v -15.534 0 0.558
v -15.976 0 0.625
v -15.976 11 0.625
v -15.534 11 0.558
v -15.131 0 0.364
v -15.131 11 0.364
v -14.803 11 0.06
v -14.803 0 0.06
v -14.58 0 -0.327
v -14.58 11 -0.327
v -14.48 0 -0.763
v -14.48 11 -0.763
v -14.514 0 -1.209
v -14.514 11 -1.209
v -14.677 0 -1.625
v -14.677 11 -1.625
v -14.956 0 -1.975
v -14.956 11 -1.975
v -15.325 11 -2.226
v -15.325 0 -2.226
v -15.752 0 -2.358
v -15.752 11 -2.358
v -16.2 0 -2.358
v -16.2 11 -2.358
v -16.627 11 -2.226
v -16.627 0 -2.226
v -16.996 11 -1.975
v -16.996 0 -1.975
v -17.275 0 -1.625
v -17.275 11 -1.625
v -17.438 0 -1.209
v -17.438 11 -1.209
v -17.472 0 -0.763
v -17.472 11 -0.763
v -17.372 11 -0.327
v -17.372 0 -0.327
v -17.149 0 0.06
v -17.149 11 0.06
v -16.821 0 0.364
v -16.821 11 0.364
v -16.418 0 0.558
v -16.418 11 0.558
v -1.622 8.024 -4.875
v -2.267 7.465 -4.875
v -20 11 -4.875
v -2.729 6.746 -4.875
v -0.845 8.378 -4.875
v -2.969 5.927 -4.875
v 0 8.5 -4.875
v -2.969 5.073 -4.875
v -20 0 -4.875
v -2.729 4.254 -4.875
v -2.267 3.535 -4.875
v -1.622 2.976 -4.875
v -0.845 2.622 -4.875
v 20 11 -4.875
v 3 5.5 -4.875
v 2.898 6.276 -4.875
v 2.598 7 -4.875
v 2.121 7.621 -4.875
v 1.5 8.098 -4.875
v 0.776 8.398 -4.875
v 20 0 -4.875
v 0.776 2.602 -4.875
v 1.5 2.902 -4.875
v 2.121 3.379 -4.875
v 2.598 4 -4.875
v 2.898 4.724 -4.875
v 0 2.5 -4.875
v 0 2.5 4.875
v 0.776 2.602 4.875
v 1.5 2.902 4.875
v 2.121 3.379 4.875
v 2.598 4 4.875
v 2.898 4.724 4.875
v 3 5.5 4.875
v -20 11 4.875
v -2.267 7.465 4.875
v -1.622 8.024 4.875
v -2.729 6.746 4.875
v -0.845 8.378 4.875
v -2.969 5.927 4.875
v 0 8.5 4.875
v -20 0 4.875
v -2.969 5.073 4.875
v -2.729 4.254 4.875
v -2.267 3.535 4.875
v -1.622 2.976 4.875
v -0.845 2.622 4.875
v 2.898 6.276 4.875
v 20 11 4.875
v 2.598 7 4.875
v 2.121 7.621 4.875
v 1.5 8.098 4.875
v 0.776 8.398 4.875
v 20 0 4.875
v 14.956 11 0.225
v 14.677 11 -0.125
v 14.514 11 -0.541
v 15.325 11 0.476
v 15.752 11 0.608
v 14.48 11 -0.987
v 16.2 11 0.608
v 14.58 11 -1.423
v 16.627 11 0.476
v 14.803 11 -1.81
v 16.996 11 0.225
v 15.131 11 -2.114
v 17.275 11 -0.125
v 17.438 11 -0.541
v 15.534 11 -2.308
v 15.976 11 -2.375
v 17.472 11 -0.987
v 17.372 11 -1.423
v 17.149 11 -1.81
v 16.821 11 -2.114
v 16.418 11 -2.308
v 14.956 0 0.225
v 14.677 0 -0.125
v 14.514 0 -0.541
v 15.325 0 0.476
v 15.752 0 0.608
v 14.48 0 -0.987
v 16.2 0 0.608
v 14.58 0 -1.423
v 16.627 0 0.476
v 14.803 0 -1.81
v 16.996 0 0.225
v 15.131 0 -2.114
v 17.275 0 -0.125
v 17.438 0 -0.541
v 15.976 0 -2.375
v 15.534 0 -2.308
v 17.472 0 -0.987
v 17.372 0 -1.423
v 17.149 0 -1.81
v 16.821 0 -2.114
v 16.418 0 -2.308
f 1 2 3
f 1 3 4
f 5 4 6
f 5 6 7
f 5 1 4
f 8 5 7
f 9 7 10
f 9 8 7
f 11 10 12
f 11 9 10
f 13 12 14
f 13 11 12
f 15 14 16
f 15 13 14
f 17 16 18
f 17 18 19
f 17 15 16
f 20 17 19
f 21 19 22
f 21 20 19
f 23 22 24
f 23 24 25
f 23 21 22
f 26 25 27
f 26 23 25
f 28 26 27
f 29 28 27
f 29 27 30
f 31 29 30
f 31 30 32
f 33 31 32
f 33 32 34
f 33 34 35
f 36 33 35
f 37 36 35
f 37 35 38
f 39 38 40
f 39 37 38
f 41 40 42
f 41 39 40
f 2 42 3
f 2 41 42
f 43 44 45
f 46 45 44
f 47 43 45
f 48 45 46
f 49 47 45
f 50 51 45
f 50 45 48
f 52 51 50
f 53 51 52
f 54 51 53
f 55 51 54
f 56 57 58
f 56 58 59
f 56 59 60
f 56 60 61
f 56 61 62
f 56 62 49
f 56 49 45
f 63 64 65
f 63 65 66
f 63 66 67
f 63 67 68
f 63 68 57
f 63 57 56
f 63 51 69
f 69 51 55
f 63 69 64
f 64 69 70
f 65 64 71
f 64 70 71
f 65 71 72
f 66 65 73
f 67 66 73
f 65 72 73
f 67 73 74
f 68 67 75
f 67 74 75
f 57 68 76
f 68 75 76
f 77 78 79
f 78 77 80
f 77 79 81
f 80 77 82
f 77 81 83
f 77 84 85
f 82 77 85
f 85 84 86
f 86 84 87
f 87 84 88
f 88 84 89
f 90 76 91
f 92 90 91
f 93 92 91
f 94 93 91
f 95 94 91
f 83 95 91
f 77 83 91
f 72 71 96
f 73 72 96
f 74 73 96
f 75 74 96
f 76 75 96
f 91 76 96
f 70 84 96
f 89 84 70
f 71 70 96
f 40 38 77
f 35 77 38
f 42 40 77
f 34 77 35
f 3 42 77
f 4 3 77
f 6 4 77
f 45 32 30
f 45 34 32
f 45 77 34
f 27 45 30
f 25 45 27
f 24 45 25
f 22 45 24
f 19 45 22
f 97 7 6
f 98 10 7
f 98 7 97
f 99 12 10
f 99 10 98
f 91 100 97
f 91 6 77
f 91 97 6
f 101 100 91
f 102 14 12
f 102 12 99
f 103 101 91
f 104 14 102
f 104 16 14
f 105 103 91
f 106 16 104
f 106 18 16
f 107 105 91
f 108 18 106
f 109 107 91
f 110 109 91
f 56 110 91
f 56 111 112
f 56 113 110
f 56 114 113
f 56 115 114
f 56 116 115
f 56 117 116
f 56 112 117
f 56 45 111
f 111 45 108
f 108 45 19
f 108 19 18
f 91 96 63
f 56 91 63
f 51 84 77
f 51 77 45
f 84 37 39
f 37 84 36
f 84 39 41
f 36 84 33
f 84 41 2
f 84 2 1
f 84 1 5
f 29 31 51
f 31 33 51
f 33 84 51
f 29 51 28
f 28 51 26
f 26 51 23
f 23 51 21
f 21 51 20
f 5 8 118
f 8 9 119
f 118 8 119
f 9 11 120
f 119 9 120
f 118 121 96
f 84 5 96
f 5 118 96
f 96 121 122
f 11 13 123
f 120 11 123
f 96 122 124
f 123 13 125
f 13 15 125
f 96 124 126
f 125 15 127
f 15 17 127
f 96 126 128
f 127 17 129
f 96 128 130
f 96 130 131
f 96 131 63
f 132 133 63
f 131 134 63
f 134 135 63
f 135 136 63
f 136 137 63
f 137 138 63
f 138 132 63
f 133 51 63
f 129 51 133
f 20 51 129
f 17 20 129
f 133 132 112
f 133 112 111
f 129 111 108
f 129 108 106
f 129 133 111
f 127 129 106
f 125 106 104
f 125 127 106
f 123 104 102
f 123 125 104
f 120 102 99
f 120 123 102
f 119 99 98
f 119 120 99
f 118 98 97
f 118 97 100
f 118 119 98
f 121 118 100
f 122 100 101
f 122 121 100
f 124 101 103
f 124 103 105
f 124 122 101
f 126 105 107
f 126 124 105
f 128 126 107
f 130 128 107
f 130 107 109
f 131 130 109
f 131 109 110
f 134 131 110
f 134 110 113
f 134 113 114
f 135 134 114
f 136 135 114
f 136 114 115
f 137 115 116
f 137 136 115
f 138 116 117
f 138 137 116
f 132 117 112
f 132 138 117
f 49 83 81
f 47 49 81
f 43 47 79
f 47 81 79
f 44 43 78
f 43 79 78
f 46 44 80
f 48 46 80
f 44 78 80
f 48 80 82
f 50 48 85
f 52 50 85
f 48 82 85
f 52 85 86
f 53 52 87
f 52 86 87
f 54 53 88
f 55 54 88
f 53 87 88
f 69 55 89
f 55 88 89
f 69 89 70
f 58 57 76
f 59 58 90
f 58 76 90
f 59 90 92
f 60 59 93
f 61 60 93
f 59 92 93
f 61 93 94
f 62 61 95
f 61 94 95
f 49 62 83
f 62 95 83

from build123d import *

# Parameters (mm, degrees)
SKETCH1_W           = 40
SKETCH1_H           = 9.75
SKETCH1_R           = 1.5
BOSS_EXTRUDE1_DEPTH = 11
CUT_EXTRUDE1_REACH  = 26.821


with BuildPart() as part:
    # Sketch1 → Boss-Extrude1 (new body)
    with BuildSketch(Plane(origin=(0, 0, 0), x_dir=(1, 0, 0), z_dir=(0, 1, 0))):
        Rectangle(SKETCH1_W, SKETCH1_H)
        with Locations(Location((-15.976056303, 0.875, 0), (0, 0, 270))):
            Circle(SKETCH1_R, mode=Mode.SUBTRACT)
        with Locations(Location((15.976056303, 0.875, 0), (0, 0, 90))):
            Circle(SKETCH1_R, mode=Mode.SUBTRACT)
    extrude(amount=BOSS_EXTRUDE1_DEPTH)

    # Sketch2 → Cut-Extrude1 (cut, up to next)
    with BuildSketch(Plane.XY.offset(4.875), mode=Mode.PRIVATE) as cut_extrude1_sk1:
        with BuildLine():
            ThreePointArc((3, 5.5), (2.121320344, 7.621320344), (0, 8.5))
            Line((0, 8.5), (0, 2.5))
            ThreePointArc((0, 2.5), (2.121320344, 3.378679656), (3, 5.5))
        make_face()
    cut_extrude1_tool1 = extrude(cut_extrude1_sk1.sketch, amount=-CUT_EXTRUDE1_REACH, mode=Mode.PRIVATE) & part.part
    # Sketch2 → Cut-Extrude1 (cut, up to next)
    with BuildSketch(Plane.XY.offset(4.875), mode=Mode.PRIVATE) as cut_extrude1_sk2:
        with BuildLine():
            Line((0, 2.5), (0, 8.5))
            ThreePointArc((0, 8.5), (-3, 5.5), (0, 2.5))
        make_face()
    cut_extrude1_tool2 = extrude(cut_extrude1_sk2.sketch, amount=-CUT_EXTRUDE1_REACH, mode=Mode.PRIVATE) & part.part
    # Sketch2 → Cut-Extrude1 (cut, up to next)
    with BuildSketch(Plane.XY.offset(4.875), mode=Mode.PRIVATE) as cut_extrude1_sk3:
        with BuildLine():
            ThreePointArc((3, 5.5), (2.121320344, 7.621320344), (0, 8.5))
            Line((0, 8.5), (0, 2.5))
            ThreePointArc((0, 2.5), (2.121320344, 3.378679656), (3, 5.5))
        make_face()
    cut_extrude1_tool3 = extrude(cut_extrude1_sk3.sketch, amount=-CUT_EXTRUDE1_REACH, mode=Mode.PRIVATE) & part.part
    # Sketch2 → Cut-Extrude1 (cut, up to next)
    with BuildSketch(Plane.XY.offset(4.875), mode=Mode.PRIVATE) as cut_extrude1_sk4:
        with BuildLine():
            Line((0, 2.5), (0, 8.5))
            ThreePointArc((0, 8.5), (-3, 5.5), (0, 2.5))
        make_face()
    cut_extrude1_tool4 = extrude(cut_extrude1_sk4.sketch, amount=-CUT_EXTRUDE1_REACH, mode=Mode.PRIVATE) & part.part
    add(cut_extrude1_tool1.solids().sort_by_distance((1.27324, 5.5, 4.875))[0], mode=Mode.SUBTRACT)
    add(cut_extrude1_tool2.solids().sort_by_distance((-1.27324, 5.5, 4.875))[0], mode=Mode.SUBTRACT)
    add(cut_extrude1_tool3.solids().sort_by_distance((1.27324, 5.5, 4.875))[0], mode=Mode.SUBTRACT)
    add(cut_extrude1_tool4.solids().sort_by_distance((-1.27324, 5.5, 4.875))[0], mode=Mode.SUBTRACT)


solid = part.part
